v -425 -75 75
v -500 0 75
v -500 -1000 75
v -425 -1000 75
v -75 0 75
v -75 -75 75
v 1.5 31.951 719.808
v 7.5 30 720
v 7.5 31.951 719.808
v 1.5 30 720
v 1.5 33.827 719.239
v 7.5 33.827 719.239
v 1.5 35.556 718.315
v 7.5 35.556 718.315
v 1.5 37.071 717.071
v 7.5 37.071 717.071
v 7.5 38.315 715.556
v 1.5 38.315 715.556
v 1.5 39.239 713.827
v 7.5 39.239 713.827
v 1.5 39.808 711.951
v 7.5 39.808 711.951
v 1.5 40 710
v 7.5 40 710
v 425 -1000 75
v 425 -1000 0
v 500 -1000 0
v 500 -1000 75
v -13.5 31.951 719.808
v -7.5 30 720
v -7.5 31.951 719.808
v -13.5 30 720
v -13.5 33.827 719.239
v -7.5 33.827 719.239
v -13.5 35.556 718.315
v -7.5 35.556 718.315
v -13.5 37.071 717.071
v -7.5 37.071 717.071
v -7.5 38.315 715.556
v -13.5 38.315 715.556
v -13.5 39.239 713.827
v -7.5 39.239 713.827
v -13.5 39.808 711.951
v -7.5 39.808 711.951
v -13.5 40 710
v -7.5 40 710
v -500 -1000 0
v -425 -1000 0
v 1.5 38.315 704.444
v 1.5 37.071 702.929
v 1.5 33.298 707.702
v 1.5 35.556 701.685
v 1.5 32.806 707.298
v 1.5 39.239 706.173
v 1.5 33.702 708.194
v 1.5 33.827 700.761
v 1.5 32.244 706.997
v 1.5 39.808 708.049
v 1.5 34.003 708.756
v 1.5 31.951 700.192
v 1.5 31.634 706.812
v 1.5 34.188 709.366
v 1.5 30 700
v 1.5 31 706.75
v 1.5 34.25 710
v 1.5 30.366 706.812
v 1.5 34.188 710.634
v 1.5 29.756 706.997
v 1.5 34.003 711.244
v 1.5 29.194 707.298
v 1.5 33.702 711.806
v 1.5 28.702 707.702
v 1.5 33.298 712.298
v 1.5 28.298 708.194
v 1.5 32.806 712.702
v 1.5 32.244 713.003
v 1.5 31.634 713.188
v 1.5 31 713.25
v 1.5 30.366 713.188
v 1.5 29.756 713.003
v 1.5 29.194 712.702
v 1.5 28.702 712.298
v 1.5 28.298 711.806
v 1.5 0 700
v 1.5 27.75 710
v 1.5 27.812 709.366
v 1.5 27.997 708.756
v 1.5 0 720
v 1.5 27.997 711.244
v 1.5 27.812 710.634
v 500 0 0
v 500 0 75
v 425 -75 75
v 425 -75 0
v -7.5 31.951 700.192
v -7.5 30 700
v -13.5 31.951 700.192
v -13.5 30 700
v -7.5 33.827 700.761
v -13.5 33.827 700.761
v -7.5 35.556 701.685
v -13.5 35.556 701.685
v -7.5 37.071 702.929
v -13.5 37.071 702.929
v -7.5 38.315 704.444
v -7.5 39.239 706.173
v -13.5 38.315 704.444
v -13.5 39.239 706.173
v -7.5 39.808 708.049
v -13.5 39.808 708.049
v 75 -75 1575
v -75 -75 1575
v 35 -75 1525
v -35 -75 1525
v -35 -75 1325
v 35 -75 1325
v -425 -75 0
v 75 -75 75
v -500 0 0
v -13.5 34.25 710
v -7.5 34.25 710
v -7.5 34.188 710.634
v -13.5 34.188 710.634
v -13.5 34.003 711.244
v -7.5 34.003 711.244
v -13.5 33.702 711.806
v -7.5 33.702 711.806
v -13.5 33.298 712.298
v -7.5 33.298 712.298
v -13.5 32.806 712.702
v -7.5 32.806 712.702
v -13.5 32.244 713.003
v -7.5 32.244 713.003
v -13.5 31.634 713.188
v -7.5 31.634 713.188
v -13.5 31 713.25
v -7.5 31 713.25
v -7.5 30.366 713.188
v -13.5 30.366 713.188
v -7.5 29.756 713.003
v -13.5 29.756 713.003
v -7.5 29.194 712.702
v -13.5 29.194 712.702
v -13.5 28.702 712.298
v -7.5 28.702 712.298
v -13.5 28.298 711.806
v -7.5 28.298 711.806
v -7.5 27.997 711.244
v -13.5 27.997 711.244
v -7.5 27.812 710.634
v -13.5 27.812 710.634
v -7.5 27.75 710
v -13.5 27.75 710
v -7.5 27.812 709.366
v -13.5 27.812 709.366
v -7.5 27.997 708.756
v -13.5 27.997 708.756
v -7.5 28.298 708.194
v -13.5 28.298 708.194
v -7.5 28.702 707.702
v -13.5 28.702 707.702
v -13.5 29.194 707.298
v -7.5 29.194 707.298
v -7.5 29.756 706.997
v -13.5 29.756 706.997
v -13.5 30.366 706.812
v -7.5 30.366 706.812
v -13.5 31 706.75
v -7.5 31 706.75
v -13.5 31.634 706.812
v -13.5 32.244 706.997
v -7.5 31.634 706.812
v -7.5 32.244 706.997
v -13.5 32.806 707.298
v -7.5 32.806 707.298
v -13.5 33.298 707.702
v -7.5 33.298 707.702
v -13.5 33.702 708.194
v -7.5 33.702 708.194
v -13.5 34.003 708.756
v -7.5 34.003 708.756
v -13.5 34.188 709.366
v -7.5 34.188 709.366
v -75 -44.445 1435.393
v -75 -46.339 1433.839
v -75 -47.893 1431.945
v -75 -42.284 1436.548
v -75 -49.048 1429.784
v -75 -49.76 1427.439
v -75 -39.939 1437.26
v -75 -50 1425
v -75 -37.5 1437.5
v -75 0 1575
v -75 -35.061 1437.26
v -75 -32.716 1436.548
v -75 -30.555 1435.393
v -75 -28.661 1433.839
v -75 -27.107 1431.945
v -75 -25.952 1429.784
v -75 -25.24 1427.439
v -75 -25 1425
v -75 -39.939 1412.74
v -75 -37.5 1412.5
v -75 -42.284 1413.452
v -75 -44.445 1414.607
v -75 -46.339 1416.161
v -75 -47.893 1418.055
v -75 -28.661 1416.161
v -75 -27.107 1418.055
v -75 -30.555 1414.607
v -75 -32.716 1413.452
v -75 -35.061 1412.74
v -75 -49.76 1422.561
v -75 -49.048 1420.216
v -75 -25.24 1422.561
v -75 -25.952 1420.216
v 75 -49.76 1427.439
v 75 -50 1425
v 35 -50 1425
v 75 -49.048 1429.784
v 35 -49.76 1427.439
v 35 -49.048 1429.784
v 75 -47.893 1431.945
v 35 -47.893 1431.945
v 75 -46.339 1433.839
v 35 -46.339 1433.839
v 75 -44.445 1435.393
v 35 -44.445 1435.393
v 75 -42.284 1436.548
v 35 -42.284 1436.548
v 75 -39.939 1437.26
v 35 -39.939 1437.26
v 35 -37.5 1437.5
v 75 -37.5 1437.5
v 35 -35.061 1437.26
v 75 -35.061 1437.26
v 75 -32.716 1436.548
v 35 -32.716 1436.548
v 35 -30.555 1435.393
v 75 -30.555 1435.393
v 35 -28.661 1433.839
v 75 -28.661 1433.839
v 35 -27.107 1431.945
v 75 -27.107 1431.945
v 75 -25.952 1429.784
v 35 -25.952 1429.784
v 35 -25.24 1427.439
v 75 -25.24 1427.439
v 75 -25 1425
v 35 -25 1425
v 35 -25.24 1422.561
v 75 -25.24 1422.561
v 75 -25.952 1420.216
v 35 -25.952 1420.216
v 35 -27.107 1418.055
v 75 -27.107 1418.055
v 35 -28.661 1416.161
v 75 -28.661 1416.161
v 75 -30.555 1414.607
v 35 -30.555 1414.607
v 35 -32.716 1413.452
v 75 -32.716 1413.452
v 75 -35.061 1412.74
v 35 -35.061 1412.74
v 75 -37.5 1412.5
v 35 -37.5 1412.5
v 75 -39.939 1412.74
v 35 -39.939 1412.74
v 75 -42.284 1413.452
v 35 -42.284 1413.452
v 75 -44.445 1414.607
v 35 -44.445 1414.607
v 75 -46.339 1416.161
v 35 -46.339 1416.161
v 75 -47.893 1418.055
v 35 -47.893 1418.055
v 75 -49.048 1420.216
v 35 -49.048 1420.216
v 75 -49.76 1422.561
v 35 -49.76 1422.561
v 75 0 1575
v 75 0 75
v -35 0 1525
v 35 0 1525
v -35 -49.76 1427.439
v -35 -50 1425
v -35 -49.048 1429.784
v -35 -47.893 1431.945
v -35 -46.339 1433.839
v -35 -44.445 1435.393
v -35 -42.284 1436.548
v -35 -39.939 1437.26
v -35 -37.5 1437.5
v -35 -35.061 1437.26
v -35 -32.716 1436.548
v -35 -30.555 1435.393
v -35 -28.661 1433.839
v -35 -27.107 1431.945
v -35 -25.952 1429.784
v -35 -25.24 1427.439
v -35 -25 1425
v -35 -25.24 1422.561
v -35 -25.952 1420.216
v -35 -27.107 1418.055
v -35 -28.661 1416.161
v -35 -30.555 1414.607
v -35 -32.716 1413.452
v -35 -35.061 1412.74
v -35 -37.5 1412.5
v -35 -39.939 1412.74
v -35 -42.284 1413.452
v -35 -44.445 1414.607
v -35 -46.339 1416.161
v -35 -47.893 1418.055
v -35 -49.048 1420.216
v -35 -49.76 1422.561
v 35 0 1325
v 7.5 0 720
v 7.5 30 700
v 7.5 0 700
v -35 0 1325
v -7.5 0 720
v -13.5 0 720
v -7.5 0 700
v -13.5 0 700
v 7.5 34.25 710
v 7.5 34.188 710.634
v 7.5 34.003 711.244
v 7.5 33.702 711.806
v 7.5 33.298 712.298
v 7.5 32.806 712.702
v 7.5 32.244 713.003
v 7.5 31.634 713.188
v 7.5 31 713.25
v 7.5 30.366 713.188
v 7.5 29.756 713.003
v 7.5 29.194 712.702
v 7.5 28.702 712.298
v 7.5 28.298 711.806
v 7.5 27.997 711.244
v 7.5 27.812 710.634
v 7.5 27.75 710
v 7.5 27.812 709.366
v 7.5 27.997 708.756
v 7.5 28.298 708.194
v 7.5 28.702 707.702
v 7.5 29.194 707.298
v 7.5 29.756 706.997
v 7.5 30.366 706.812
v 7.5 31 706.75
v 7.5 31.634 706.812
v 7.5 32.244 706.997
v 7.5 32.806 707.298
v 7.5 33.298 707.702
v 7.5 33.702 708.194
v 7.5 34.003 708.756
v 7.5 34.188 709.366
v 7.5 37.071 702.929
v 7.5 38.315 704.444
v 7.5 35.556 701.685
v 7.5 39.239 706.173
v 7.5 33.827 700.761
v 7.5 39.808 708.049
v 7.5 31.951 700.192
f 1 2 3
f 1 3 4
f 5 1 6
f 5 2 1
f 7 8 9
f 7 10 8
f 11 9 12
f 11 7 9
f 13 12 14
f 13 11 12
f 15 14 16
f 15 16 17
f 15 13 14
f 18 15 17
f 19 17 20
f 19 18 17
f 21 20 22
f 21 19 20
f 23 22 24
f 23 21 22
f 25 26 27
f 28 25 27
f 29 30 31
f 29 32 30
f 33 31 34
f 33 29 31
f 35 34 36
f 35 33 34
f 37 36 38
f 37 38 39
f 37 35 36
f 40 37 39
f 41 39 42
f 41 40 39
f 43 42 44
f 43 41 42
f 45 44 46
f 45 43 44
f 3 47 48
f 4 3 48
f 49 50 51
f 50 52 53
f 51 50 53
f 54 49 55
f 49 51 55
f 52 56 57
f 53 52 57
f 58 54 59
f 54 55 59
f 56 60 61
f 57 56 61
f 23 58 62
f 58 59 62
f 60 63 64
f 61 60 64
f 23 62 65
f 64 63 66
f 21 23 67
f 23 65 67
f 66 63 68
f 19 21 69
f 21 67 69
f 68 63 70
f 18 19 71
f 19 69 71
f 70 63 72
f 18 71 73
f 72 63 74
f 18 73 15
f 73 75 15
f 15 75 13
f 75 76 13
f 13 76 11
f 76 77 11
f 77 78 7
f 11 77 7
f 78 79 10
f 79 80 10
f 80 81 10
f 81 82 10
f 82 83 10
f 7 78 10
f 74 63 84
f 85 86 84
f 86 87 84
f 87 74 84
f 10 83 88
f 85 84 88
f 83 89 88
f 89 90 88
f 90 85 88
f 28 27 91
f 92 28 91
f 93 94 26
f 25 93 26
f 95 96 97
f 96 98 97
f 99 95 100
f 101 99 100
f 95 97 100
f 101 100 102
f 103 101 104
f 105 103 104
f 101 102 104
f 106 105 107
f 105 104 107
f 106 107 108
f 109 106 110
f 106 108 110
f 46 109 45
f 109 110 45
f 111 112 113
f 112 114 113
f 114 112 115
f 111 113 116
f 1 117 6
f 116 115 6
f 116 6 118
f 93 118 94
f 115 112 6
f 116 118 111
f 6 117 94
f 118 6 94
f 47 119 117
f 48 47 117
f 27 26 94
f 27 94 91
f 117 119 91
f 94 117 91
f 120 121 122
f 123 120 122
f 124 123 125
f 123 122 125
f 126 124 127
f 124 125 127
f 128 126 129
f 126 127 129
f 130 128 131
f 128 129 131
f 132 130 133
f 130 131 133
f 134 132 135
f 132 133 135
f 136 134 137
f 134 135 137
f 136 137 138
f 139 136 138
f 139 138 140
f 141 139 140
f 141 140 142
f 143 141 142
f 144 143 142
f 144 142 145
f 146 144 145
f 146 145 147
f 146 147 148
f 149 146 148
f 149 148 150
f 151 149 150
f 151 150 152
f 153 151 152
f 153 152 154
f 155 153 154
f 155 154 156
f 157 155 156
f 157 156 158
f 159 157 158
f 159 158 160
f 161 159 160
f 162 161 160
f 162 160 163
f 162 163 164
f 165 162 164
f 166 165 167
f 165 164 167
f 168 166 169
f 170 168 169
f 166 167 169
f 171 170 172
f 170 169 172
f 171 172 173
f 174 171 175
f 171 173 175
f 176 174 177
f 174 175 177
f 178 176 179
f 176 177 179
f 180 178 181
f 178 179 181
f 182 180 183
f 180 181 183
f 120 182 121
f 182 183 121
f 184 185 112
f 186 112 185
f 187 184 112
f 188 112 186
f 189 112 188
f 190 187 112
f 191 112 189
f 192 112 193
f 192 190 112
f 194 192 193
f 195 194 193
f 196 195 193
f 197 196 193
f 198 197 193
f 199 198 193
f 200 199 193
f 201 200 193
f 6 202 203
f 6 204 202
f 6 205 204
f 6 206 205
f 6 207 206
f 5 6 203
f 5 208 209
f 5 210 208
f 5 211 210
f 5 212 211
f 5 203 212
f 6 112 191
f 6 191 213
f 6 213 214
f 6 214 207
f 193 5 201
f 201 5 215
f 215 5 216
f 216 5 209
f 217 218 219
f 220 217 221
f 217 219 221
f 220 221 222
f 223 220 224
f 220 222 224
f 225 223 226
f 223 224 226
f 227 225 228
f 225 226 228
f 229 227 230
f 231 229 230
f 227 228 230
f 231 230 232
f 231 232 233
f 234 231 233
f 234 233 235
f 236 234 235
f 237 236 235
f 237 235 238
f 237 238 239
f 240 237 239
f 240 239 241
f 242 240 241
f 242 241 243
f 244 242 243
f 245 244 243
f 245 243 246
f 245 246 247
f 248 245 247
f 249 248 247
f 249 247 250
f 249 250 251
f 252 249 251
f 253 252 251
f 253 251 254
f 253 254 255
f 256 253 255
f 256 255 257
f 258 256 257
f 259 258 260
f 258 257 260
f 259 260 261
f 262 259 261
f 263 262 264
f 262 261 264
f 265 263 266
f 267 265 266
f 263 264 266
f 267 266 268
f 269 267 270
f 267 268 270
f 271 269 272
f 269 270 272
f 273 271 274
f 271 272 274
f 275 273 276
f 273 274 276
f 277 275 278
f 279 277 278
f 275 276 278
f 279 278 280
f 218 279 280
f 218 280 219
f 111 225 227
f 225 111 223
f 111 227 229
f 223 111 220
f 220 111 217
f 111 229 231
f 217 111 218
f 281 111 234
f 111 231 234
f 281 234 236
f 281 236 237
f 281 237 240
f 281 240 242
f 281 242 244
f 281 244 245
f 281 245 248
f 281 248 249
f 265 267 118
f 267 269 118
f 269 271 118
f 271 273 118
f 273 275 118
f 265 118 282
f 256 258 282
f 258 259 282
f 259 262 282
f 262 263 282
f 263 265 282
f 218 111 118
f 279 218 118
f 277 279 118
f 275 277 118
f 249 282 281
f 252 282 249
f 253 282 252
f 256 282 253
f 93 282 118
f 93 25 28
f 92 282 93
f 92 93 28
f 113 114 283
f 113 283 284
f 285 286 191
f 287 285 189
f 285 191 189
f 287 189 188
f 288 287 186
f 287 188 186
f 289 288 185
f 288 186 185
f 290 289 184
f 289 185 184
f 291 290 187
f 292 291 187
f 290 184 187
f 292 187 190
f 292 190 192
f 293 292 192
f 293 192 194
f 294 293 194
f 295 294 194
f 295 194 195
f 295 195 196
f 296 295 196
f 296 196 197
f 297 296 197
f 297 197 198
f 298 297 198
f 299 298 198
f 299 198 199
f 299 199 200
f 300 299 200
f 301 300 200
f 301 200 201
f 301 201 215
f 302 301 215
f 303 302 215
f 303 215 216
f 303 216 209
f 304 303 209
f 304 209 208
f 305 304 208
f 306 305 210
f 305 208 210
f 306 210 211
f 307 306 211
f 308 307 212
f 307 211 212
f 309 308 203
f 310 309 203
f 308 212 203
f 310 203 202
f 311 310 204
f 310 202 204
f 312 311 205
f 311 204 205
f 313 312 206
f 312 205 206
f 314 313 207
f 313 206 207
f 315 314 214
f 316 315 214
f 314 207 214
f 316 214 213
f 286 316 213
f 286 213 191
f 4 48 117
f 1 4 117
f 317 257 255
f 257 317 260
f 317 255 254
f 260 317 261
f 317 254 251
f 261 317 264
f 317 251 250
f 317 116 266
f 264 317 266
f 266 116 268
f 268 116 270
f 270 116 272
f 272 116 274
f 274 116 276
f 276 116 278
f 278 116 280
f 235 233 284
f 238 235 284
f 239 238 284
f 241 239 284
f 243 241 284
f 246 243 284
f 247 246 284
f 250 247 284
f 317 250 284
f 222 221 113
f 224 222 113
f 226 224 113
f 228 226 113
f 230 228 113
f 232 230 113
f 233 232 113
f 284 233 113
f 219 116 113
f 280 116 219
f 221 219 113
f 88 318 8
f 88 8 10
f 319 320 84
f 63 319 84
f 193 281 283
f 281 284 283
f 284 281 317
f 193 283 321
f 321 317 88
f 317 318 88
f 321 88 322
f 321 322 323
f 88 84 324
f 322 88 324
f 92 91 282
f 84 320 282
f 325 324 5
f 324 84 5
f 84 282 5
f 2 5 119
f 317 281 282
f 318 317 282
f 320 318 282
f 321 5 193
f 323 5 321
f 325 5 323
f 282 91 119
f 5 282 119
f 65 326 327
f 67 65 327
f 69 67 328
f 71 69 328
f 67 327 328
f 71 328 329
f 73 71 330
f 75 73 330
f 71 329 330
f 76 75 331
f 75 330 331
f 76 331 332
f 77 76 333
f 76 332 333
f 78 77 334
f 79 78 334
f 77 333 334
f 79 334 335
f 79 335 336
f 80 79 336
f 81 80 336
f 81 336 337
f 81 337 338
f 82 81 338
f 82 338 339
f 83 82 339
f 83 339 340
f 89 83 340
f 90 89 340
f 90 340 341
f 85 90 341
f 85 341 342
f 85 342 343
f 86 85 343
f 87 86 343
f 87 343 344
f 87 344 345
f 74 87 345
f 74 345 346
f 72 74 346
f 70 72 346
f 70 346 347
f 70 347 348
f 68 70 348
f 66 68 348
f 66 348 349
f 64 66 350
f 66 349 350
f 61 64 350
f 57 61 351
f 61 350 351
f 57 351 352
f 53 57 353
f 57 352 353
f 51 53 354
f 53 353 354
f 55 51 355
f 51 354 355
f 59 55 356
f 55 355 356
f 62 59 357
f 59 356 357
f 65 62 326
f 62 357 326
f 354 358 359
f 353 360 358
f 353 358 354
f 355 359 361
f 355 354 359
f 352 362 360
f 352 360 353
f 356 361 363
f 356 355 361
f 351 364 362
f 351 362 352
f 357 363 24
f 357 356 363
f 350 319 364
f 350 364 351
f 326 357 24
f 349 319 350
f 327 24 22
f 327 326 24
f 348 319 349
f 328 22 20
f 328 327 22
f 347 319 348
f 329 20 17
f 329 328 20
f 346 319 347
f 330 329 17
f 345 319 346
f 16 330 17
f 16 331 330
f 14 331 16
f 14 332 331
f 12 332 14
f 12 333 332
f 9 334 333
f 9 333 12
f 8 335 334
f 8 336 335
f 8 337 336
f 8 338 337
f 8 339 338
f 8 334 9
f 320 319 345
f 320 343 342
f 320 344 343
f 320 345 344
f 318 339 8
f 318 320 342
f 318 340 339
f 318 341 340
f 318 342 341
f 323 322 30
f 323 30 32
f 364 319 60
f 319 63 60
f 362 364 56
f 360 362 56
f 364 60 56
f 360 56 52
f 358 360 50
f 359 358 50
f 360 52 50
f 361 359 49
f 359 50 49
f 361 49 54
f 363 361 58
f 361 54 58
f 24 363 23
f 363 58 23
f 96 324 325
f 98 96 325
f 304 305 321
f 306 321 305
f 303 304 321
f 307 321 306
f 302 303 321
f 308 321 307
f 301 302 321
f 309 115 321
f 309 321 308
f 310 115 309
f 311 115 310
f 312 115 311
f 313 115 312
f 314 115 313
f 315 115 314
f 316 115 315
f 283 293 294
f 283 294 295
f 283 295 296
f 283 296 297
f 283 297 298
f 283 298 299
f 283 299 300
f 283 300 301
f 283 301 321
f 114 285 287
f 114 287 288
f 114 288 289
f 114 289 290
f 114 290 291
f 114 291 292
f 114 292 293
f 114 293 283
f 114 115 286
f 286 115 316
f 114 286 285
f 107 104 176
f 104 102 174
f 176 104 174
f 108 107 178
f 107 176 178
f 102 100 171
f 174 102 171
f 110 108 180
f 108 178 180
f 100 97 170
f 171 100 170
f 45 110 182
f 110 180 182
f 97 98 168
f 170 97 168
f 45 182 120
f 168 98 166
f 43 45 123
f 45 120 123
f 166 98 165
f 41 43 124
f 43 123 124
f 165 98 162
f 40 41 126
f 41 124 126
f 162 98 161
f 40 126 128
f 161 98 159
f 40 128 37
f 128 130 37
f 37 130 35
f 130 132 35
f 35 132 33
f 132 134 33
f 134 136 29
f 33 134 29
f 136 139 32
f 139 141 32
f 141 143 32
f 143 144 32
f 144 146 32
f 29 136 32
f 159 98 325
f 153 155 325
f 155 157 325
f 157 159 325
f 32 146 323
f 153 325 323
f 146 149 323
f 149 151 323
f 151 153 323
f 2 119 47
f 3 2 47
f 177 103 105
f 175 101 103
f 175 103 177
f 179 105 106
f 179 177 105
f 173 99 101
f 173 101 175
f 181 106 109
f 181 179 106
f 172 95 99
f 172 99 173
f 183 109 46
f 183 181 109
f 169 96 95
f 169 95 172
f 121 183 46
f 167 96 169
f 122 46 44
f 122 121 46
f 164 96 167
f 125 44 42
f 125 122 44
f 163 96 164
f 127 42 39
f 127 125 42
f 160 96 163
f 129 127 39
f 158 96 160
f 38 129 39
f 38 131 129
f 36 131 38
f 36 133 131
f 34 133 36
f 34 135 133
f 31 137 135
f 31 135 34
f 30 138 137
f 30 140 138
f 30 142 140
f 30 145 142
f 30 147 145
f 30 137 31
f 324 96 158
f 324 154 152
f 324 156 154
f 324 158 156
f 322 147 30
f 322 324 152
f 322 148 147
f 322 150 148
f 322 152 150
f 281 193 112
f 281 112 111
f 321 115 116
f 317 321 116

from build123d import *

# Parameters (mm, degrees)
F1_DEPTH  = 75
F2_W      = 150
F2_H      = 75
F3_DEPTH  = 1500
F4_W      = 70
F4_H      = 200
F5_DEPTH  = 75.001
F6_W      = 6
F6_H      = 20
F7_DEPTH  = 40
F8_R      = 9.99999
F9_R      = 3.25
F10_DEPTH = 507.501
F12_R     = 12.5
F13_DEPTH = 575.001


# Not quite as in the source:
# - a fillet or chamfer is up to 0.001 mm smaller than in the source, because OpenCascade refuses the exact size
# - a feature of the source that left no trace in its solid (it failed there, or was rolled back) is left out


with BuildPart() as f1:
    # F0 (on Top) → F1 (new body)
    with BuildSketch(Plane.XY):
        Polygon((500, 0), (-500, 0), (-500, -1000), (-425, -1000), (-425, -75), (425, -75), (425, -1000), (500, -1000), align=None)
    extrude(amount=F1_DEPTH)

    # F2 (on face) → F3 (join)
    with BuildSketch(Plane.XY.offset(75)):
        with Locations((0, -37.5)):
            Rectangle(F2_W, F2_H)
    extrude(amount=F3_DEPTH)

    # F4 (on face) → F5 (cut, through all)
    with BuildSketch(Plane.XZ.offset(75)):
        with Locations((0, 1425)):
            Rectangle(F4_W, F4_H)
    extrude(amount=-F5_DEPTH, mode=Mode.SUBTRACT)

    # F6 (on face) → F7 (join)
    with BuildSketch(Plane(origin=(0, 0, 0), x_dir=(-1, 0, 0), z_dir=(0, 1, 0))):
        with Locations((-4.5, 710)):
            Rectangle(F6_W, F6_H)
        with Locations((10.5, 710)):
            Rectangle(F6_W, F6_H)
    extrude(amount=F7_DEPTH)

    # F8 (radius 10 in the source; OpenCascade refuses exactly that, so slightly less here)
    f8_edges = [f1.edges().sort_by_distance(p)[0] for p in [
        (4.5, 40, 720),
        (4.5, 40, 700),
        (-10.5, 40, 720),
        (-10.5, 40, 700),
    ]]
    fillet(f8_edges, radius=F8_R)

    # F9 (on face) → F10 (cut, through all)
    with BuildSketch(Plane.YZ.offset(7.5)):
        with Locations((31, 710)):
            Circle(F9_R)
    extrude(amount=-F10_DEPTH, mode=Mode.SUBTRACT)

    # F12 (on face) → F13 (cut, through all)
    with BuildSketch(Plane(origin=(-75, 0, 0), x_dir=(0, -1, 0), z_dir=(-1, 0, 0))):
        with Locations((37.5, 1425)):
            Circle(F12_R)
    extrude(amount=-F13_DEPTH, mode=Mode.SUBTRACT)


solid = f1.part
